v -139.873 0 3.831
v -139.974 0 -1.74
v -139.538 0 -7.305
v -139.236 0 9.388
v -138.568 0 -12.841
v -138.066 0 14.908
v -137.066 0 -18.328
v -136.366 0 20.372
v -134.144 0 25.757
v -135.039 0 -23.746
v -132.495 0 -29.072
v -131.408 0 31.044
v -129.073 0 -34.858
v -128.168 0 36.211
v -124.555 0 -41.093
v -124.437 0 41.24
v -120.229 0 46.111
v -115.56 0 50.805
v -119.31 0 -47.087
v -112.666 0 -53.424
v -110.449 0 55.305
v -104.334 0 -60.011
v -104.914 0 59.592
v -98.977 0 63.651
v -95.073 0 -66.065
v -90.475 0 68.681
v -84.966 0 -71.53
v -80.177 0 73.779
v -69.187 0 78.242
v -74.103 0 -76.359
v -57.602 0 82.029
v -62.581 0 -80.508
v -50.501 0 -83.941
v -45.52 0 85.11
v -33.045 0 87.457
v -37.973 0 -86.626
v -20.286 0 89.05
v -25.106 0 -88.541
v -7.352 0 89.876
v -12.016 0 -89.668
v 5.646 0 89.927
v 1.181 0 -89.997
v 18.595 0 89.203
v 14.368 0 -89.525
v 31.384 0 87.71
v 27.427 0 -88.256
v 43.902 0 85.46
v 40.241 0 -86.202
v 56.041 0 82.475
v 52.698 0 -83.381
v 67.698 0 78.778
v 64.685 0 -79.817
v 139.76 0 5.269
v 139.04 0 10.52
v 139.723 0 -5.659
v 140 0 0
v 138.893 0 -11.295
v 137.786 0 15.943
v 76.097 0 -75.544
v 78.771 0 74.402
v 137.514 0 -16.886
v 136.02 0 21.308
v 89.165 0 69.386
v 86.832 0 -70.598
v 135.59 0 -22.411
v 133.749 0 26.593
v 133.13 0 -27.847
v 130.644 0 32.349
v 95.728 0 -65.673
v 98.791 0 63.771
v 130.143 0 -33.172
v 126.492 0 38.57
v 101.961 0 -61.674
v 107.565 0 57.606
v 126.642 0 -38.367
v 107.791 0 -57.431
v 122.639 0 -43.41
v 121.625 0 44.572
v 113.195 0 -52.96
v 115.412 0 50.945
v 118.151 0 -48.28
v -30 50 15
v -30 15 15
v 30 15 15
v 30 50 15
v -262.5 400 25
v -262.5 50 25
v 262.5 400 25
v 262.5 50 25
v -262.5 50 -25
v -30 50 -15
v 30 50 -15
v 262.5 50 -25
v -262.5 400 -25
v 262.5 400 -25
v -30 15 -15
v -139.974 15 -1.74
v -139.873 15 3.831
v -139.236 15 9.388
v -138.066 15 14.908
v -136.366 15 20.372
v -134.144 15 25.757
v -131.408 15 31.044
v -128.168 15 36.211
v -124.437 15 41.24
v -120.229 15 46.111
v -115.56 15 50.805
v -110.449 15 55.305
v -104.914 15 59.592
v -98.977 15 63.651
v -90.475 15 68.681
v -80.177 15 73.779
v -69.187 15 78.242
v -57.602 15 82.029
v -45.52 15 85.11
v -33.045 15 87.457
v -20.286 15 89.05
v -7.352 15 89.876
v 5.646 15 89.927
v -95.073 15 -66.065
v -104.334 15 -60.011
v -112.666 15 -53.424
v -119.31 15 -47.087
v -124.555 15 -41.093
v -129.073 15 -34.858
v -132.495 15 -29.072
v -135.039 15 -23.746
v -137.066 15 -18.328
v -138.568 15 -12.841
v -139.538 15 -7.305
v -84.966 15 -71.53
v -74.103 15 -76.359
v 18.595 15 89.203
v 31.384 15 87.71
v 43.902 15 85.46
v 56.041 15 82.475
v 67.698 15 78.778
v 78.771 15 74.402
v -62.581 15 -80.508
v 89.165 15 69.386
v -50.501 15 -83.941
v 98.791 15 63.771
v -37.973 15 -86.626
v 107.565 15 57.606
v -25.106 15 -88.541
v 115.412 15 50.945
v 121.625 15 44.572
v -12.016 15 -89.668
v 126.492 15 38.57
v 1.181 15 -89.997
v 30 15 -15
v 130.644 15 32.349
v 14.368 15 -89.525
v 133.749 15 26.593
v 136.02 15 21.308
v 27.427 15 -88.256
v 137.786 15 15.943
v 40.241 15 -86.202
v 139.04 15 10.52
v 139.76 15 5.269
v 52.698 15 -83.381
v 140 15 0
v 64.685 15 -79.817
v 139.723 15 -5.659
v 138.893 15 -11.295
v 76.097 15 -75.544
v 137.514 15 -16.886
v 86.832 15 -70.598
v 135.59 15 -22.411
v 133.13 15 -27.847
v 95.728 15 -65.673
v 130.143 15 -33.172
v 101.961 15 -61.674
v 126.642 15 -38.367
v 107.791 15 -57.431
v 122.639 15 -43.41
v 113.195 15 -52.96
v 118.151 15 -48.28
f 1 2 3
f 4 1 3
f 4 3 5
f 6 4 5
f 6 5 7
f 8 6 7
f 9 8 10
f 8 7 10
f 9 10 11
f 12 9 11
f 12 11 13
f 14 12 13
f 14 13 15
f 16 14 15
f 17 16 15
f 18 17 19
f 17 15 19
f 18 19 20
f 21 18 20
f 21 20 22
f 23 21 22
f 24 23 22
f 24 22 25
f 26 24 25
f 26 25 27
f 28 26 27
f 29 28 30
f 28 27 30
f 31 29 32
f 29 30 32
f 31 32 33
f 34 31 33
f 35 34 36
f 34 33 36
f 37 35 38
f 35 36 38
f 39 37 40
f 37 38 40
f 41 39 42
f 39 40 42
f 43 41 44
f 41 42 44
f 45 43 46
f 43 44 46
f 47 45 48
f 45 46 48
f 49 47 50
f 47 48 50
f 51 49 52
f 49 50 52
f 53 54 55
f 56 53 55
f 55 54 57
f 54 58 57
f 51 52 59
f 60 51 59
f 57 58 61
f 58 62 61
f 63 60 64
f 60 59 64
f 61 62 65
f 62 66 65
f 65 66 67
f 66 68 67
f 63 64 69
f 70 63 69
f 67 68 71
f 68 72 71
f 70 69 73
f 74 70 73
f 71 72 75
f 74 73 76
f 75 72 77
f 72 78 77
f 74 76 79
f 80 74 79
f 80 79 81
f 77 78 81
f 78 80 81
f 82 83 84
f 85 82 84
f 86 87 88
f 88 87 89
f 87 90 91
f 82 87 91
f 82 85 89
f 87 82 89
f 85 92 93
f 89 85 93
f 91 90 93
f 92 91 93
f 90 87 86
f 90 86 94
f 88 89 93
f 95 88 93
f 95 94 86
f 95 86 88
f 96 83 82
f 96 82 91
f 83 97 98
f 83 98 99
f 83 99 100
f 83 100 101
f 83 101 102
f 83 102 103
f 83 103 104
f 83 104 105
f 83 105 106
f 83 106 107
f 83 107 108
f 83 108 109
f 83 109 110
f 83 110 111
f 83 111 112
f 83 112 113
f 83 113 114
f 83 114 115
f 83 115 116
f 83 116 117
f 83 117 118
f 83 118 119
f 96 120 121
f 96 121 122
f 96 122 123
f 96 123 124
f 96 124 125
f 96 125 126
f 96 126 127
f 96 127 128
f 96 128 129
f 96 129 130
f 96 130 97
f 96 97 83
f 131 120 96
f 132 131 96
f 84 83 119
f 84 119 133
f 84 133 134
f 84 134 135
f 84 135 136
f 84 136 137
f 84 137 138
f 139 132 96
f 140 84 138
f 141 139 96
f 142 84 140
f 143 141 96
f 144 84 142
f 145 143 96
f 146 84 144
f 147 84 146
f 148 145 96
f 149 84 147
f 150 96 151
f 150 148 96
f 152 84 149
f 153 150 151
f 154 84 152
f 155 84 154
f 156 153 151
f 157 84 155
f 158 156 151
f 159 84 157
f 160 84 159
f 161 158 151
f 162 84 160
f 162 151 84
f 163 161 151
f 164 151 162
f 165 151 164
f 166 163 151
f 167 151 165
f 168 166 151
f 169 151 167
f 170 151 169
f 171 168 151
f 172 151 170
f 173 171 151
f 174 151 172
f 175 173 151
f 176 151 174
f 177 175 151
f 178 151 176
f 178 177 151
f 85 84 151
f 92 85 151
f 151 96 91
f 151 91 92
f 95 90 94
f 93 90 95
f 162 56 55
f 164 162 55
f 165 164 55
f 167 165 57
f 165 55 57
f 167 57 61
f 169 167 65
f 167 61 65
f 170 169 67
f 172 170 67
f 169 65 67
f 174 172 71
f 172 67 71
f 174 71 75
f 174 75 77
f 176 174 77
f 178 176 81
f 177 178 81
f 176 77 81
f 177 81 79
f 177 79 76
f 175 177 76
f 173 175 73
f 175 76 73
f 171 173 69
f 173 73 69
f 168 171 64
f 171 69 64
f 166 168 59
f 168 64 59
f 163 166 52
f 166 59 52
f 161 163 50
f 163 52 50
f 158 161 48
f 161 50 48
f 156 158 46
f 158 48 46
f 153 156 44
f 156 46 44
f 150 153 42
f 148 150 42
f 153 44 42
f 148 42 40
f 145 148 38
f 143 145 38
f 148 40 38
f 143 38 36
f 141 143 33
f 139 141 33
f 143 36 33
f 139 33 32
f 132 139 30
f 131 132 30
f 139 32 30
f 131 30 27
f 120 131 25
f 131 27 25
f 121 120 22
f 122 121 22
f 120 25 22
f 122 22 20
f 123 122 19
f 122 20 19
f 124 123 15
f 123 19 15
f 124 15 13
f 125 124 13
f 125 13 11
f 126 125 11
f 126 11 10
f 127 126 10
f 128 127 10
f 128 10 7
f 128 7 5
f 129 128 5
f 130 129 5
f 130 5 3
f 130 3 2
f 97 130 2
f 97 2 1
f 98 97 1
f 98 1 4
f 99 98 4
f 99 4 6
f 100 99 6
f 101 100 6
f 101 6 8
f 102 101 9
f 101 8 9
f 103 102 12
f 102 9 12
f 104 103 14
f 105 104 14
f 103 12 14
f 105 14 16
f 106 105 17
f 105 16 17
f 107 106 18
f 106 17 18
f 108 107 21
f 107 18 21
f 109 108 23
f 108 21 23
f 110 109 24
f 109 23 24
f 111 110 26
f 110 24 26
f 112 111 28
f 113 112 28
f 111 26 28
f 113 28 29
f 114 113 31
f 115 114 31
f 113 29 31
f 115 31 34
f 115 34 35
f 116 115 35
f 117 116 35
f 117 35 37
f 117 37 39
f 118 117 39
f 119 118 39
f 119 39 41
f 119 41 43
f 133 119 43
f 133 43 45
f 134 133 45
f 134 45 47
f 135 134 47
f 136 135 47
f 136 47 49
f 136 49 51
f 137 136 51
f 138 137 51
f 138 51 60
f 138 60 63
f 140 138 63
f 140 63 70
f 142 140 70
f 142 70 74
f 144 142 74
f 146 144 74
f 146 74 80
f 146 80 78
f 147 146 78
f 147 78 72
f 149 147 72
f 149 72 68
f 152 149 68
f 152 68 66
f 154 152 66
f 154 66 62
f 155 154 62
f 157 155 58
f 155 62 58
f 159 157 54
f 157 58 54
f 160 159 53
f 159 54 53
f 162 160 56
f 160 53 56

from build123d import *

# Parameters (mm, degrees)
SKETCH1_RX          = 140
SKETCH1_RY          = 90
BOSS_EXTRUDE1_DEPTH = 15
SKETCH2_W           = 60
SKETCH2_H           = 30
BOSS_EXTRUDE2_DEPTH = 35
SKETCH3_W           = 525
SKETCH3_H           = 50
BOSS_EXTRUDE3_DEPTH = 350


with BuildPart() as part:
    # Sketch1 → Boss-Extrude1 (new body)
    with BuildSketch(Plane(origin=(0, 0, 0), x_dir=(1, 0, 0), z_dir=(0, 1, 0))):
        with Locations((0, 0)):
            Ellipse(SKETCH1_RX, SKETCH1_RY)
    extrude(amount=BOSS_EXTRUDE1_DEPTH)

    # Sketch2 → Boss-Extrude2 (add)
    with BuildSketch(Plane(origin=(0, 15, 0), x_dir=(1, 0, 0), z_dir=(0, 1, 0))):
        Rectangle(SKETCH2_W, SKETCH2_H)
    extrude(amount=BOSS_EXTRUDE2_DEPTH)

    # Sketch3 → Boss-Extrude3 (add)
    with BuildSketch(Plane(origin=(0, 50, 0), x_dir=(1, 0, 0), z_dir=(0, 1, 0))):
        Rectangle(SKETCH3_W, SKETCH3_H)
    extrude(amount=BOSS_EXTRUDE3_DEPTH)


solid = part.part
